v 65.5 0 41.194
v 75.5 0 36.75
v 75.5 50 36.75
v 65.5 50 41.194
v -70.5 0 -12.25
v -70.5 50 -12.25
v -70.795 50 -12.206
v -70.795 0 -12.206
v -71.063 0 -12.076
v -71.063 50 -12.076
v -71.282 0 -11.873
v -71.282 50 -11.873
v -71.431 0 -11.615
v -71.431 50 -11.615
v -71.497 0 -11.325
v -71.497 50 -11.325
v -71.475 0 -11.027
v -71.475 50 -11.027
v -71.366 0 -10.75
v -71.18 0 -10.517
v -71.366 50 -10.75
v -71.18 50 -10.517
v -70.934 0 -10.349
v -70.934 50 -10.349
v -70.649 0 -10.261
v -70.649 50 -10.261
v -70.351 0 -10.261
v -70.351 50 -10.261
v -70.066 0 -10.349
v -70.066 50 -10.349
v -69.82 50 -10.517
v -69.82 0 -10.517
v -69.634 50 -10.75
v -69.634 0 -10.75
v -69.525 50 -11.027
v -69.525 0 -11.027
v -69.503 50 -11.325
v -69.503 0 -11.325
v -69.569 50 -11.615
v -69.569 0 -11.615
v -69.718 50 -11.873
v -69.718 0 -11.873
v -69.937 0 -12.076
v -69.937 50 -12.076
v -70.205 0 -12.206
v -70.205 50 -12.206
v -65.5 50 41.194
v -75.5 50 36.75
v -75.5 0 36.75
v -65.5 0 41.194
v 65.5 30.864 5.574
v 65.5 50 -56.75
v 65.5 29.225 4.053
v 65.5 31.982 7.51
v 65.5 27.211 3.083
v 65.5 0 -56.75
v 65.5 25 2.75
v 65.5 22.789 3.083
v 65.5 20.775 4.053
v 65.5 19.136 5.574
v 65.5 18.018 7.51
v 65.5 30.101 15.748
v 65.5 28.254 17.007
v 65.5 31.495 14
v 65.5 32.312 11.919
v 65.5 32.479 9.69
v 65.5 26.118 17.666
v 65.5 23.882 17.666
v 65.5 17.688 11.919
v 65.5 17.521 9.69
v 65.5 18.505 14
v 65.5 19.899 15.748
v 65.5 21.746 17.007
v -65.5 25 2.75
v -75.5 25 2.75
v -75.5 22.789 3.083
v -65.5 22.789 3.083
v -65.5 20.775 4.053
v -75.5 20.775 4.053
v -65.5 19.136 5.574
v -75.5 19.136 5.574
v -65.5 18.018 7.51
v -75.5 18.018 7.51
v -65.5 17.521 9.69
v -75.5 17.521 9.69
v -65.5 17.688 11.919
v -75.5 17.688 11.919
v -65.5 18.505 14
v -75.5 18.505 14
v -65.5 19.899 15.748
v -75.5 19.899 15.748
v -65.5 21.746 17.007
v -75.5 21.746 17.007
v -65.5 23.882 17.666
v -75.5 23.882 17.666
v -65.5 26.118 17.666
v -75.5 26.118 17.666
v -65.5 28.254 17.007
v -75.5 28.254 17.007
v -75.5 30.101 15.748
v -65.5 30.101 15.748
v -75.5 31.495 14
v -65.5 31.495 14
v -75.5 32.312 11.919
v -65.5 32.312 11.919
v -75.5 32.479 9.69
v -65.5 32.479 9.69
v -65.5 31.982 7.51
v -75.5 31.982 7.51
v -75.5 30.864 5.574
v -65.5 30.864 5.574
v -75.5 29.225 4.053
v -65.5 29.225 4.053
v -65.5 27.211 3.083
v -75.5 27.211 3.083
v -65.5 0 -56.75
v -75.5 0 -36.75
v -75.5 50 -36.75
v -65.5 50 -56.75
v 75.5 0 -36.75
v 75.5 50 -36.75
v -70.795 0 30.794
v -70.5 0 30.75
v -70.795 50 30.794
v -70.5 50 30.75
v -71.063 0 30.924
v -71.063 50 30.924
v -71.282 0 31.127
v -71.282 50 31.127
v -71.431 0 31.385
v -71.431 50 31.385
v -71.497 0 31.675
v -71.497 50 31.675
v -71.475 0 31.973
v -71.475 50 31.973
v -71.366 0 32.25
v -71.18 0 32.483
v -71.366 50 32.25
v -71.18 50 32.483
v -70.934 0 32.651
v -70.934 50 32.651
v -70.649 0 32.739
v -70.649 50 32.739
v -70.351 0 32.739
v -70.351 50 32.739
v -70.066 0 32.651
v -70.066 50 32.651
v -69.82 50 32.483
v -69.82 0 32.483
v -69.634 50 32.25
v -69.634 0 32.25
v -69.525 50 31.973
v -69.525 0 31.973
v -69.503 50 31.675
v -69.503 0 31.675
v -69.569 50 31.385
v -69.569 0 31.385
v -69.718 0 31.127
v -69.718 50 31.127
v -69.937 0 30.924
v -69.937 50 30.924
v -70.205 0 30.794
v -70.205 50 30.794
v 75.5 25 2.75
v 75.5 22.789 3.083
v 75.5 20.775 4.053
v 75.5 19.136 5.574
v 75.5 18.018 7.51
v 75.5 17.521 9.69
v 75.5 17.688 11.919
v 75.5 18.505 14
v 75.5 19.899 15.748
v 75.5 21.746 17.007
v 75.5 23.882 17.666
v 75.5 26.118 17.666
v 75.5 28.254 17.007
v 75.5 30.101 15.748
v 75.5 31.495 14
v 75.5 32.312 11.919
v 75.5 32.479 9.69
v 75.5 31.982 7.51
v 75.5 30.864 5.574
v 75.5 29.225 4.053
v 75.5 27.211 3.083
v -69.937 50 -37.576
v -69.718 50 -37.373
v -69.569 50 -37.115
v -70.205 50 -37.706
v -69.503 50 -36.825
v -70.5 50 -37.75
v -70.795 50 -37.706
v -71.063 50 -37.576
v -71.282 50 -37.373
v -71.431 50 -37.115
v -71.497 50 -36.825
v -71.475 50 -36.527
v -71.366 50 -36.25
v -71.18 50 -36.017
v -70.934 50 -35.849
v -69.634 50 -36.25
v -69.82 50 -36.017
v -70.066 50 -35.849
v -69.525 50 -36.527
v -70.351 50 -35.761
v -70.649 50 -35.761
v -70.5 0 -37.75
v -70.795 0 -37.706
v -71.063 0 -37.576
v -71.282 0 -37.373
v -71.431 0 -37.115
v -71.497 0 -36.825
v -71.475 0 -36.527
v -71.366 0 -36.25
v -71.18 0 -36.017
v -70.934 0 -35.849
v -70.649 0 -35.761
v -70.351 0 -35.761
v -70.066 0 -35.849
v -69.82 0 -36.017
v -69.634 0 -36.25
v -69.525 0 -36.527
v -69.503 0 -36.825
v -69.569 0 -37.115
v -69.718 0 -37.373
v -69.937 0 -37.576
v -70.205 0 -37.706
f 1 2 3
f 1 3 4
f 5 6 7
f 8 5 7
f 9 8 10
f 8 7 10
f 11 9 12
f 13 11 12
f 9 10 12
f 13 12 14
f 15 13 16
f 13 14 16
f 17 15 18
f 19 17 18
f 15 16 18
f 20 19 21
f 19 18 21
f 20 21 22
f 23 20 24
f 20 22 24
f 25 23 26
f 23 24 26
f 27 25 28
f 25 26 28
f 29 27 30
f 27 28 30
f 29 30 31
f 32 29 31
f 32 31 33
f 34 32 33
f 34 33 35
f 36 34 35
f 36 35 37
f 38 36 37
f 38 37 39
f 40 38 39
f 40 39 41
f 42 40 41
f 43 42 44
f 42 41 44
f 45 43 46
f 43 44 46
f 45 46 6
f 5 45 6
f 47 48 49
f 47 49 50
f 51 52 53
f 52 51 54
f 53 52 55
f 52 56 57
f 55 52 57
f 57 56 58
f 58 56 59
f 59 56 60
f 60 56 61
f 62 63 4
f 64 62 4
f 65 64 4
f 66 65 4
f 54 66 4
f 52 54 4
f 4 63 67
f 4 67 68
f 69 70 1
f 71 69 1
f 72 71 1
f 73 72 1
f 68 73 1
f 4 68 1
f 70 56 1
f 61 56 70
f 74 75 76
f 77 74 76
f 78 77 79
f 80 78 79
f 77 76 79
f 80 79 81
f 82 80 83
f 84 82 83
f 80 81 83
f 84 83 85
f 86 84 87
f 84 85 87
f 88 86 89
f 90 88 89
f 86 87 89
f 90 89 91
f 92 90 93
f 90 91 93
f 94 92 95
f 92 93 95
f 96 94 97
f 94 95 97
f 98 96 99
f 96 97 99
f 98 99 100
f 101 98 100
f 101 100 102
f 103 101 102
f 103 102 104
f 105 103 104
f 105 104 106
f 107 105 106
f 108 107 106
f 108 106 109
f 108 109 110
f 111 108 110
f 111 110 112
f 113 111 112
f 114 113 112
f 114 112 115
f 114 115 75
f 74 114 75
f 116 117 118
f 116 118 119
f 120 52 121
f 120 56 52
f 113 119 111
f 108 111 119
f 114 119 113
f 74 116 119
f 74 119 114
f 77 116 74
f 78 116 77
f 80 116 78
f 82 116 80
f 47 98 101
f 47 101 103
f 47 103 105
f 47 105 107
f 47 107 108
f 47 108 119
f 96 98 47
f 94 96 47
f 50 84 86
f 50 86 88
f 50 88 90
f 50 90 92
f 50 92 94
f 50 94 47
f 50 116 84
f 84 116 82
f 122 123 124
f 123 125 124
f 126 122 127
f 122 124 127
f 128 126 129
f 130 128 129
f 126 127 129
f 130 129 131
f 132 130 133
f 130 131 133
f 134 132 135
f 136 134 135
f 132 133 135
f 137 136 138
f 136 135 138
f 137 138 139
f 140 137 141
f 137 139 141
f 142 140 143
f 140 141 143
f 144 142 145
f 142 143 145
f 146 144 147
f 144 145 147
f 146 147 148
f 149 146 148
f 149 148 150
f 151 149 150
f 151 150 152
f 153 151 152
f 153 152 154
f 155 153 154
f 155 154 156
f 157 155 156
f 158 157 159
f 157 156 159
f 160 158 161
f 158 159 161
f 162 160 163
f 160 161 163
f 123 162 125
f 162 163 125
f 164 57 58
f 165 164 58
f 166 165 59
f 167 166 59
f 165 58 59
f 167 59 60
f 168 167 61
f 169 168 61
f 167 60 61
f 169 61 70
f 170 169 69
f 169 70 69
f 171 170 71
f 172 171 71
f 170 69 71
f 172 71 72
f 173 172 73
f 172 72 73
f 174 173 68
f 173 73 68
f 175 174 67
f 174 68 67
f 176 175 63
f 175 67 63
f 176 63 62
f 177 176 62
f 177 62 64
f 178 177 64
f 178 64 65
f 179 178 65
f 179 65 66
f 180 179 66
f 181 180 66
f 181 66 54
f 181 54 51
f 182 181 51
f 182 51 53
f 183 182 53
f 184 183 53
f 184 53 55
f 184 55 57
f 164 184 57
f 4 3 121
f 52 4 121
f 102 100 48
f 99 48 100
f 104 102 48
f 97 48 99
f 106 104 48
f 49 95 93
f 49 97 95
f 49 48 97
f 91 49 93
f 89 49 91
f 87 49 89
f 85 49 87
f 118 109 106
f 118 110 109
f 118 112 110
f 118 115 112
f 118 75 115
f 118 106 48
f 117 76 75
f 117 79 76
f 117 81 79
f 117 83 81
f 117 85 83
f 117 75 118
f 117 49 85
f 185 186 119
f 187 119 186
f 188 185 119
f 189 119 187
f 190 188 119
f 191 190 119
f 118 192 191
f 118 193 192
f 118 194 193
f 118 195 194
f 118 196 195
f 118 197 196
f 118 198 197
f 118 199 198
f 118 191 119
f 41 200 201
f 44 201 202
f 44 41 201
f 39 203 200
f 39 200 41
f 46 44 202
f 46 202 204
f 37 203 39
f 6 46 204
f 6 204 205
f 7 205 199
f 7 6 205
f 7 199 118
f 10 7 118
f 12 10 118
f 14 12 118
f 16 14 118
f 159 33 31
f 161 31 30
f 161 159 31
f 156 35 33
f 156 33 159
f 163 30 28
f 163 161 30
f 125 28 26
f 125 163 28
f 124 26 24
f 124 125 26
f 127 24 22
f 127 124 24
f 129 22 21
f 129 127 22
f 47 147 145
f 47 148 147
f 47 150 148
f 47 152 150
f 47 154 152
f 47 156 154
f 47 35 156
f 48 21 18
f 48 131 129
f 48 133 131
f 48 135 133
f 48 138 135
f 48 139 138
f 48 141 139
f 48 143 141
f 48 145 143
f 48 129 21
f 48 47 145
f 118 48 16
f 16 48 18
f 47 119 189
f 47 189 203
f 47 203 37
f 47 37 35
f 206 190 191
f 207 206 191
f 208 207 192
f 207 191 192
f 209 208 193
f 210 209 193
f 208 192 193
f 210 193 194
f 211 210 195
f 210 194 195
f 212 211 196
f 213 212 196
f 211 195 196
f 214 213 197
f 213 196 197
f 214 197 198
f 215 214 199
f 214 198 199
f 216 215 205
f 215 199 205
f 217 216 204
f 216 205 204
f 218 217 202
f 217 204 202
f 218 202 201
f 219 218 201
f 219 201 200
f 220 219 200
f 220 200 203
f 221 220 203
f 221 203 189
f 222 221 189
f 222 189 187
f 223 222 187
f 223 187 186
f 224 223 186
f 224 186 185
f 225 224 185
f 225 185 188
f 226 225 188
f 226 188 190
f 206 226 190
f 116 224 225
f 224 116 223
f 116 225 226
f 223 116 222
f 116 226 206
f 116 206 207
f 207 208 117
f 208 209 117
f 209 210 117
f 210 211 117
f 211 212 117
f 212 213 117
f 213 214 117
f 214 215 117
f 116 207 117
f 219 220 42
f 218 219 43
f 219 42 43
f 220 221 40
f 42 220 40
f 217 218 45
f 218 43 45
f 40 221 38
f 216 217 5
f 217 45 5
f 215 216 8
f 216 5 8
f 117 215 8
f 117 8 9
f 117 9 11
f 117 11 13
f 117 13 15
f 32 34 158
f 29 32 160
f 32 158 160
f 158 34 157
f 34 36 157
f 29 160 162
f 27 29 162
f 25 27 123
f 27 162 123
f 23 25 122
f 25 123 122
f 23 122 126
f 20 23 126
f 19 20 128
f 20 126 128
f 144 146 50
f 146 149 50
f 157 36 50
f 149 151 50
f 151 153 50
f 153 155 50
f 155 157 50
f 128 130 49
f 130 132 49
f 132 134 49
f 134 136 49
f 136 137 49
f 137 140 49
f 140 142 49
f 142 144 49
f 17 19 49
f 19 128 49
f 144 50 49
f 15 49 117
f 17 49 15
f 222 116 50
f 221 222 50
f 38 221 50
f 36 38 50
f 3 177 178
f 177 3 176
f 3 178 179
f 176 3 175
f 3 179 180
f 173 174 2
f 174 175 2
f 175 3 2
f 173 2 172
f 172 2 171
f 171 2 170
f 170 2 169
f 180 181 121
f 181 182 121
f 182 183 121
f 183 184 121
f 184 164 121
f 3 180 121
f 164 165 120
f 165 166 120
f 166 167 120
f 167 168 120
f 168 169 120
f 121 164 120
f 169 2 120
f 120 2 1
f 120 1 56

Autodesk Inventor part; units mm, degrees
ref_plane "YZ Plane" through (0, 0, 0) normal (1, 0, 0) x (0, 1, 0)
ref_plane "XZ Plane" through (0, 0, 0) normal (0, 1, 0) x (-1, 0, 0)
ref_plane "XY Plane" through (0, 0, 0) normal (0, 0, 1) x (1, 0, 0)
sketch "Sketch1" plane through (0, 0, 0) normal (0, 1, 0) x (-1, 0, 0)
  line L0 (65.5, 36.75) -> (75.5, 36.75)
  line L1 (75.5, 36.75) -> (75.5, -36.75)
  line L2 (75.5, -36.75) -> (65.5, -36.75)
  line L3 (75.5, -36.75) -> (65.5, -56.75)
  line L4 (75.5, 36.75) -> (65.5, 41.1944)
  line L5 (-65.5, 36.75) -> (-75.5, 36.75)
  line L6 (-75.5, 36.75) -> (-75.5, -36.75)
  line L7 (-75.5, -36.75) -> (-65.5, -36.75)
  line L8 (-65.5, -56.75) -> (-75.5, -36.75)
  line L9 (-75.5, 36.75) -> (-65.5, 41.1944)
  line L10 (65.5, -56.75) -> (65.5, 41.1944)
  line L11 (-65.5, -56.75) -> (-65.5, 41.1944)
  dimension "d3" = 10
  dimension "d4" = 73.5
  dimension "d5" = 10
  dimension "d8" = 10
  dimension "d9" = 73.5
extrude "Extrusion1" add sketch "Sketch1" along normal blind 50
sketch "Sketch2" plane through (75.5, 0, 36.75) normal (1, 0, 0) x (0, 0, -1)
  circle A0 centre (26.5, 25) radius 7.5
  dimension "d16" = 15
hole "Hole1" at (75.5, 25, 10.25) direction (-1, 0, 0) diameter 15 depth 151
sketch "Sketch3" plane through (0, 0, 0) normal (0, -1, 0) x (1, 0, 0)
  line L0 (-65.5, -56.75) -> (-75.5, -36.75) projected
  line L1 (-65.5, 41.1944) -> (-65.5, -56.75) projected
  line L2 (-75.5, -36.75) -> (-75.5, 36.75) projected
  line L3 (-75.5, 36.75) -> (-75.5, 31.75)
  line L4 (-75.5, 31.75) -> (-70.5, 31.75)
  line L5 (-75.5, 36.75) -> (-75.5, -11.25)
  line L6 (-75.5, -11.25) -> (-70.5, -11.25)
  line L7 (-75.5, 36.75) -> (-75.5, -36.75)
  line L8 (-75.5, -36.75) -> (-70.5, -36.75)
  circle A0 centre (-70.5, 31.75) radius 3.4428
  circle A1 centre (-70.5, -11.25) radius 5.0721
  circle A2 centre (-70.5, -36.75) radius 4.4721
  point P0 (0, 0)
  dimension "d24" = 5
  dimension "d25" = 5
  dimension "d26" = 48
  dimension "d27" = 5
  dimension "d28" = 5
hole "Hole2" at (-70.5, 0, 31.75) at (-70.5, 0, -11.25) at (-70.5, 0, -36.75) direction (0, 1, 0) diameter 2 depth 50
properties part number "zadni_strana"
